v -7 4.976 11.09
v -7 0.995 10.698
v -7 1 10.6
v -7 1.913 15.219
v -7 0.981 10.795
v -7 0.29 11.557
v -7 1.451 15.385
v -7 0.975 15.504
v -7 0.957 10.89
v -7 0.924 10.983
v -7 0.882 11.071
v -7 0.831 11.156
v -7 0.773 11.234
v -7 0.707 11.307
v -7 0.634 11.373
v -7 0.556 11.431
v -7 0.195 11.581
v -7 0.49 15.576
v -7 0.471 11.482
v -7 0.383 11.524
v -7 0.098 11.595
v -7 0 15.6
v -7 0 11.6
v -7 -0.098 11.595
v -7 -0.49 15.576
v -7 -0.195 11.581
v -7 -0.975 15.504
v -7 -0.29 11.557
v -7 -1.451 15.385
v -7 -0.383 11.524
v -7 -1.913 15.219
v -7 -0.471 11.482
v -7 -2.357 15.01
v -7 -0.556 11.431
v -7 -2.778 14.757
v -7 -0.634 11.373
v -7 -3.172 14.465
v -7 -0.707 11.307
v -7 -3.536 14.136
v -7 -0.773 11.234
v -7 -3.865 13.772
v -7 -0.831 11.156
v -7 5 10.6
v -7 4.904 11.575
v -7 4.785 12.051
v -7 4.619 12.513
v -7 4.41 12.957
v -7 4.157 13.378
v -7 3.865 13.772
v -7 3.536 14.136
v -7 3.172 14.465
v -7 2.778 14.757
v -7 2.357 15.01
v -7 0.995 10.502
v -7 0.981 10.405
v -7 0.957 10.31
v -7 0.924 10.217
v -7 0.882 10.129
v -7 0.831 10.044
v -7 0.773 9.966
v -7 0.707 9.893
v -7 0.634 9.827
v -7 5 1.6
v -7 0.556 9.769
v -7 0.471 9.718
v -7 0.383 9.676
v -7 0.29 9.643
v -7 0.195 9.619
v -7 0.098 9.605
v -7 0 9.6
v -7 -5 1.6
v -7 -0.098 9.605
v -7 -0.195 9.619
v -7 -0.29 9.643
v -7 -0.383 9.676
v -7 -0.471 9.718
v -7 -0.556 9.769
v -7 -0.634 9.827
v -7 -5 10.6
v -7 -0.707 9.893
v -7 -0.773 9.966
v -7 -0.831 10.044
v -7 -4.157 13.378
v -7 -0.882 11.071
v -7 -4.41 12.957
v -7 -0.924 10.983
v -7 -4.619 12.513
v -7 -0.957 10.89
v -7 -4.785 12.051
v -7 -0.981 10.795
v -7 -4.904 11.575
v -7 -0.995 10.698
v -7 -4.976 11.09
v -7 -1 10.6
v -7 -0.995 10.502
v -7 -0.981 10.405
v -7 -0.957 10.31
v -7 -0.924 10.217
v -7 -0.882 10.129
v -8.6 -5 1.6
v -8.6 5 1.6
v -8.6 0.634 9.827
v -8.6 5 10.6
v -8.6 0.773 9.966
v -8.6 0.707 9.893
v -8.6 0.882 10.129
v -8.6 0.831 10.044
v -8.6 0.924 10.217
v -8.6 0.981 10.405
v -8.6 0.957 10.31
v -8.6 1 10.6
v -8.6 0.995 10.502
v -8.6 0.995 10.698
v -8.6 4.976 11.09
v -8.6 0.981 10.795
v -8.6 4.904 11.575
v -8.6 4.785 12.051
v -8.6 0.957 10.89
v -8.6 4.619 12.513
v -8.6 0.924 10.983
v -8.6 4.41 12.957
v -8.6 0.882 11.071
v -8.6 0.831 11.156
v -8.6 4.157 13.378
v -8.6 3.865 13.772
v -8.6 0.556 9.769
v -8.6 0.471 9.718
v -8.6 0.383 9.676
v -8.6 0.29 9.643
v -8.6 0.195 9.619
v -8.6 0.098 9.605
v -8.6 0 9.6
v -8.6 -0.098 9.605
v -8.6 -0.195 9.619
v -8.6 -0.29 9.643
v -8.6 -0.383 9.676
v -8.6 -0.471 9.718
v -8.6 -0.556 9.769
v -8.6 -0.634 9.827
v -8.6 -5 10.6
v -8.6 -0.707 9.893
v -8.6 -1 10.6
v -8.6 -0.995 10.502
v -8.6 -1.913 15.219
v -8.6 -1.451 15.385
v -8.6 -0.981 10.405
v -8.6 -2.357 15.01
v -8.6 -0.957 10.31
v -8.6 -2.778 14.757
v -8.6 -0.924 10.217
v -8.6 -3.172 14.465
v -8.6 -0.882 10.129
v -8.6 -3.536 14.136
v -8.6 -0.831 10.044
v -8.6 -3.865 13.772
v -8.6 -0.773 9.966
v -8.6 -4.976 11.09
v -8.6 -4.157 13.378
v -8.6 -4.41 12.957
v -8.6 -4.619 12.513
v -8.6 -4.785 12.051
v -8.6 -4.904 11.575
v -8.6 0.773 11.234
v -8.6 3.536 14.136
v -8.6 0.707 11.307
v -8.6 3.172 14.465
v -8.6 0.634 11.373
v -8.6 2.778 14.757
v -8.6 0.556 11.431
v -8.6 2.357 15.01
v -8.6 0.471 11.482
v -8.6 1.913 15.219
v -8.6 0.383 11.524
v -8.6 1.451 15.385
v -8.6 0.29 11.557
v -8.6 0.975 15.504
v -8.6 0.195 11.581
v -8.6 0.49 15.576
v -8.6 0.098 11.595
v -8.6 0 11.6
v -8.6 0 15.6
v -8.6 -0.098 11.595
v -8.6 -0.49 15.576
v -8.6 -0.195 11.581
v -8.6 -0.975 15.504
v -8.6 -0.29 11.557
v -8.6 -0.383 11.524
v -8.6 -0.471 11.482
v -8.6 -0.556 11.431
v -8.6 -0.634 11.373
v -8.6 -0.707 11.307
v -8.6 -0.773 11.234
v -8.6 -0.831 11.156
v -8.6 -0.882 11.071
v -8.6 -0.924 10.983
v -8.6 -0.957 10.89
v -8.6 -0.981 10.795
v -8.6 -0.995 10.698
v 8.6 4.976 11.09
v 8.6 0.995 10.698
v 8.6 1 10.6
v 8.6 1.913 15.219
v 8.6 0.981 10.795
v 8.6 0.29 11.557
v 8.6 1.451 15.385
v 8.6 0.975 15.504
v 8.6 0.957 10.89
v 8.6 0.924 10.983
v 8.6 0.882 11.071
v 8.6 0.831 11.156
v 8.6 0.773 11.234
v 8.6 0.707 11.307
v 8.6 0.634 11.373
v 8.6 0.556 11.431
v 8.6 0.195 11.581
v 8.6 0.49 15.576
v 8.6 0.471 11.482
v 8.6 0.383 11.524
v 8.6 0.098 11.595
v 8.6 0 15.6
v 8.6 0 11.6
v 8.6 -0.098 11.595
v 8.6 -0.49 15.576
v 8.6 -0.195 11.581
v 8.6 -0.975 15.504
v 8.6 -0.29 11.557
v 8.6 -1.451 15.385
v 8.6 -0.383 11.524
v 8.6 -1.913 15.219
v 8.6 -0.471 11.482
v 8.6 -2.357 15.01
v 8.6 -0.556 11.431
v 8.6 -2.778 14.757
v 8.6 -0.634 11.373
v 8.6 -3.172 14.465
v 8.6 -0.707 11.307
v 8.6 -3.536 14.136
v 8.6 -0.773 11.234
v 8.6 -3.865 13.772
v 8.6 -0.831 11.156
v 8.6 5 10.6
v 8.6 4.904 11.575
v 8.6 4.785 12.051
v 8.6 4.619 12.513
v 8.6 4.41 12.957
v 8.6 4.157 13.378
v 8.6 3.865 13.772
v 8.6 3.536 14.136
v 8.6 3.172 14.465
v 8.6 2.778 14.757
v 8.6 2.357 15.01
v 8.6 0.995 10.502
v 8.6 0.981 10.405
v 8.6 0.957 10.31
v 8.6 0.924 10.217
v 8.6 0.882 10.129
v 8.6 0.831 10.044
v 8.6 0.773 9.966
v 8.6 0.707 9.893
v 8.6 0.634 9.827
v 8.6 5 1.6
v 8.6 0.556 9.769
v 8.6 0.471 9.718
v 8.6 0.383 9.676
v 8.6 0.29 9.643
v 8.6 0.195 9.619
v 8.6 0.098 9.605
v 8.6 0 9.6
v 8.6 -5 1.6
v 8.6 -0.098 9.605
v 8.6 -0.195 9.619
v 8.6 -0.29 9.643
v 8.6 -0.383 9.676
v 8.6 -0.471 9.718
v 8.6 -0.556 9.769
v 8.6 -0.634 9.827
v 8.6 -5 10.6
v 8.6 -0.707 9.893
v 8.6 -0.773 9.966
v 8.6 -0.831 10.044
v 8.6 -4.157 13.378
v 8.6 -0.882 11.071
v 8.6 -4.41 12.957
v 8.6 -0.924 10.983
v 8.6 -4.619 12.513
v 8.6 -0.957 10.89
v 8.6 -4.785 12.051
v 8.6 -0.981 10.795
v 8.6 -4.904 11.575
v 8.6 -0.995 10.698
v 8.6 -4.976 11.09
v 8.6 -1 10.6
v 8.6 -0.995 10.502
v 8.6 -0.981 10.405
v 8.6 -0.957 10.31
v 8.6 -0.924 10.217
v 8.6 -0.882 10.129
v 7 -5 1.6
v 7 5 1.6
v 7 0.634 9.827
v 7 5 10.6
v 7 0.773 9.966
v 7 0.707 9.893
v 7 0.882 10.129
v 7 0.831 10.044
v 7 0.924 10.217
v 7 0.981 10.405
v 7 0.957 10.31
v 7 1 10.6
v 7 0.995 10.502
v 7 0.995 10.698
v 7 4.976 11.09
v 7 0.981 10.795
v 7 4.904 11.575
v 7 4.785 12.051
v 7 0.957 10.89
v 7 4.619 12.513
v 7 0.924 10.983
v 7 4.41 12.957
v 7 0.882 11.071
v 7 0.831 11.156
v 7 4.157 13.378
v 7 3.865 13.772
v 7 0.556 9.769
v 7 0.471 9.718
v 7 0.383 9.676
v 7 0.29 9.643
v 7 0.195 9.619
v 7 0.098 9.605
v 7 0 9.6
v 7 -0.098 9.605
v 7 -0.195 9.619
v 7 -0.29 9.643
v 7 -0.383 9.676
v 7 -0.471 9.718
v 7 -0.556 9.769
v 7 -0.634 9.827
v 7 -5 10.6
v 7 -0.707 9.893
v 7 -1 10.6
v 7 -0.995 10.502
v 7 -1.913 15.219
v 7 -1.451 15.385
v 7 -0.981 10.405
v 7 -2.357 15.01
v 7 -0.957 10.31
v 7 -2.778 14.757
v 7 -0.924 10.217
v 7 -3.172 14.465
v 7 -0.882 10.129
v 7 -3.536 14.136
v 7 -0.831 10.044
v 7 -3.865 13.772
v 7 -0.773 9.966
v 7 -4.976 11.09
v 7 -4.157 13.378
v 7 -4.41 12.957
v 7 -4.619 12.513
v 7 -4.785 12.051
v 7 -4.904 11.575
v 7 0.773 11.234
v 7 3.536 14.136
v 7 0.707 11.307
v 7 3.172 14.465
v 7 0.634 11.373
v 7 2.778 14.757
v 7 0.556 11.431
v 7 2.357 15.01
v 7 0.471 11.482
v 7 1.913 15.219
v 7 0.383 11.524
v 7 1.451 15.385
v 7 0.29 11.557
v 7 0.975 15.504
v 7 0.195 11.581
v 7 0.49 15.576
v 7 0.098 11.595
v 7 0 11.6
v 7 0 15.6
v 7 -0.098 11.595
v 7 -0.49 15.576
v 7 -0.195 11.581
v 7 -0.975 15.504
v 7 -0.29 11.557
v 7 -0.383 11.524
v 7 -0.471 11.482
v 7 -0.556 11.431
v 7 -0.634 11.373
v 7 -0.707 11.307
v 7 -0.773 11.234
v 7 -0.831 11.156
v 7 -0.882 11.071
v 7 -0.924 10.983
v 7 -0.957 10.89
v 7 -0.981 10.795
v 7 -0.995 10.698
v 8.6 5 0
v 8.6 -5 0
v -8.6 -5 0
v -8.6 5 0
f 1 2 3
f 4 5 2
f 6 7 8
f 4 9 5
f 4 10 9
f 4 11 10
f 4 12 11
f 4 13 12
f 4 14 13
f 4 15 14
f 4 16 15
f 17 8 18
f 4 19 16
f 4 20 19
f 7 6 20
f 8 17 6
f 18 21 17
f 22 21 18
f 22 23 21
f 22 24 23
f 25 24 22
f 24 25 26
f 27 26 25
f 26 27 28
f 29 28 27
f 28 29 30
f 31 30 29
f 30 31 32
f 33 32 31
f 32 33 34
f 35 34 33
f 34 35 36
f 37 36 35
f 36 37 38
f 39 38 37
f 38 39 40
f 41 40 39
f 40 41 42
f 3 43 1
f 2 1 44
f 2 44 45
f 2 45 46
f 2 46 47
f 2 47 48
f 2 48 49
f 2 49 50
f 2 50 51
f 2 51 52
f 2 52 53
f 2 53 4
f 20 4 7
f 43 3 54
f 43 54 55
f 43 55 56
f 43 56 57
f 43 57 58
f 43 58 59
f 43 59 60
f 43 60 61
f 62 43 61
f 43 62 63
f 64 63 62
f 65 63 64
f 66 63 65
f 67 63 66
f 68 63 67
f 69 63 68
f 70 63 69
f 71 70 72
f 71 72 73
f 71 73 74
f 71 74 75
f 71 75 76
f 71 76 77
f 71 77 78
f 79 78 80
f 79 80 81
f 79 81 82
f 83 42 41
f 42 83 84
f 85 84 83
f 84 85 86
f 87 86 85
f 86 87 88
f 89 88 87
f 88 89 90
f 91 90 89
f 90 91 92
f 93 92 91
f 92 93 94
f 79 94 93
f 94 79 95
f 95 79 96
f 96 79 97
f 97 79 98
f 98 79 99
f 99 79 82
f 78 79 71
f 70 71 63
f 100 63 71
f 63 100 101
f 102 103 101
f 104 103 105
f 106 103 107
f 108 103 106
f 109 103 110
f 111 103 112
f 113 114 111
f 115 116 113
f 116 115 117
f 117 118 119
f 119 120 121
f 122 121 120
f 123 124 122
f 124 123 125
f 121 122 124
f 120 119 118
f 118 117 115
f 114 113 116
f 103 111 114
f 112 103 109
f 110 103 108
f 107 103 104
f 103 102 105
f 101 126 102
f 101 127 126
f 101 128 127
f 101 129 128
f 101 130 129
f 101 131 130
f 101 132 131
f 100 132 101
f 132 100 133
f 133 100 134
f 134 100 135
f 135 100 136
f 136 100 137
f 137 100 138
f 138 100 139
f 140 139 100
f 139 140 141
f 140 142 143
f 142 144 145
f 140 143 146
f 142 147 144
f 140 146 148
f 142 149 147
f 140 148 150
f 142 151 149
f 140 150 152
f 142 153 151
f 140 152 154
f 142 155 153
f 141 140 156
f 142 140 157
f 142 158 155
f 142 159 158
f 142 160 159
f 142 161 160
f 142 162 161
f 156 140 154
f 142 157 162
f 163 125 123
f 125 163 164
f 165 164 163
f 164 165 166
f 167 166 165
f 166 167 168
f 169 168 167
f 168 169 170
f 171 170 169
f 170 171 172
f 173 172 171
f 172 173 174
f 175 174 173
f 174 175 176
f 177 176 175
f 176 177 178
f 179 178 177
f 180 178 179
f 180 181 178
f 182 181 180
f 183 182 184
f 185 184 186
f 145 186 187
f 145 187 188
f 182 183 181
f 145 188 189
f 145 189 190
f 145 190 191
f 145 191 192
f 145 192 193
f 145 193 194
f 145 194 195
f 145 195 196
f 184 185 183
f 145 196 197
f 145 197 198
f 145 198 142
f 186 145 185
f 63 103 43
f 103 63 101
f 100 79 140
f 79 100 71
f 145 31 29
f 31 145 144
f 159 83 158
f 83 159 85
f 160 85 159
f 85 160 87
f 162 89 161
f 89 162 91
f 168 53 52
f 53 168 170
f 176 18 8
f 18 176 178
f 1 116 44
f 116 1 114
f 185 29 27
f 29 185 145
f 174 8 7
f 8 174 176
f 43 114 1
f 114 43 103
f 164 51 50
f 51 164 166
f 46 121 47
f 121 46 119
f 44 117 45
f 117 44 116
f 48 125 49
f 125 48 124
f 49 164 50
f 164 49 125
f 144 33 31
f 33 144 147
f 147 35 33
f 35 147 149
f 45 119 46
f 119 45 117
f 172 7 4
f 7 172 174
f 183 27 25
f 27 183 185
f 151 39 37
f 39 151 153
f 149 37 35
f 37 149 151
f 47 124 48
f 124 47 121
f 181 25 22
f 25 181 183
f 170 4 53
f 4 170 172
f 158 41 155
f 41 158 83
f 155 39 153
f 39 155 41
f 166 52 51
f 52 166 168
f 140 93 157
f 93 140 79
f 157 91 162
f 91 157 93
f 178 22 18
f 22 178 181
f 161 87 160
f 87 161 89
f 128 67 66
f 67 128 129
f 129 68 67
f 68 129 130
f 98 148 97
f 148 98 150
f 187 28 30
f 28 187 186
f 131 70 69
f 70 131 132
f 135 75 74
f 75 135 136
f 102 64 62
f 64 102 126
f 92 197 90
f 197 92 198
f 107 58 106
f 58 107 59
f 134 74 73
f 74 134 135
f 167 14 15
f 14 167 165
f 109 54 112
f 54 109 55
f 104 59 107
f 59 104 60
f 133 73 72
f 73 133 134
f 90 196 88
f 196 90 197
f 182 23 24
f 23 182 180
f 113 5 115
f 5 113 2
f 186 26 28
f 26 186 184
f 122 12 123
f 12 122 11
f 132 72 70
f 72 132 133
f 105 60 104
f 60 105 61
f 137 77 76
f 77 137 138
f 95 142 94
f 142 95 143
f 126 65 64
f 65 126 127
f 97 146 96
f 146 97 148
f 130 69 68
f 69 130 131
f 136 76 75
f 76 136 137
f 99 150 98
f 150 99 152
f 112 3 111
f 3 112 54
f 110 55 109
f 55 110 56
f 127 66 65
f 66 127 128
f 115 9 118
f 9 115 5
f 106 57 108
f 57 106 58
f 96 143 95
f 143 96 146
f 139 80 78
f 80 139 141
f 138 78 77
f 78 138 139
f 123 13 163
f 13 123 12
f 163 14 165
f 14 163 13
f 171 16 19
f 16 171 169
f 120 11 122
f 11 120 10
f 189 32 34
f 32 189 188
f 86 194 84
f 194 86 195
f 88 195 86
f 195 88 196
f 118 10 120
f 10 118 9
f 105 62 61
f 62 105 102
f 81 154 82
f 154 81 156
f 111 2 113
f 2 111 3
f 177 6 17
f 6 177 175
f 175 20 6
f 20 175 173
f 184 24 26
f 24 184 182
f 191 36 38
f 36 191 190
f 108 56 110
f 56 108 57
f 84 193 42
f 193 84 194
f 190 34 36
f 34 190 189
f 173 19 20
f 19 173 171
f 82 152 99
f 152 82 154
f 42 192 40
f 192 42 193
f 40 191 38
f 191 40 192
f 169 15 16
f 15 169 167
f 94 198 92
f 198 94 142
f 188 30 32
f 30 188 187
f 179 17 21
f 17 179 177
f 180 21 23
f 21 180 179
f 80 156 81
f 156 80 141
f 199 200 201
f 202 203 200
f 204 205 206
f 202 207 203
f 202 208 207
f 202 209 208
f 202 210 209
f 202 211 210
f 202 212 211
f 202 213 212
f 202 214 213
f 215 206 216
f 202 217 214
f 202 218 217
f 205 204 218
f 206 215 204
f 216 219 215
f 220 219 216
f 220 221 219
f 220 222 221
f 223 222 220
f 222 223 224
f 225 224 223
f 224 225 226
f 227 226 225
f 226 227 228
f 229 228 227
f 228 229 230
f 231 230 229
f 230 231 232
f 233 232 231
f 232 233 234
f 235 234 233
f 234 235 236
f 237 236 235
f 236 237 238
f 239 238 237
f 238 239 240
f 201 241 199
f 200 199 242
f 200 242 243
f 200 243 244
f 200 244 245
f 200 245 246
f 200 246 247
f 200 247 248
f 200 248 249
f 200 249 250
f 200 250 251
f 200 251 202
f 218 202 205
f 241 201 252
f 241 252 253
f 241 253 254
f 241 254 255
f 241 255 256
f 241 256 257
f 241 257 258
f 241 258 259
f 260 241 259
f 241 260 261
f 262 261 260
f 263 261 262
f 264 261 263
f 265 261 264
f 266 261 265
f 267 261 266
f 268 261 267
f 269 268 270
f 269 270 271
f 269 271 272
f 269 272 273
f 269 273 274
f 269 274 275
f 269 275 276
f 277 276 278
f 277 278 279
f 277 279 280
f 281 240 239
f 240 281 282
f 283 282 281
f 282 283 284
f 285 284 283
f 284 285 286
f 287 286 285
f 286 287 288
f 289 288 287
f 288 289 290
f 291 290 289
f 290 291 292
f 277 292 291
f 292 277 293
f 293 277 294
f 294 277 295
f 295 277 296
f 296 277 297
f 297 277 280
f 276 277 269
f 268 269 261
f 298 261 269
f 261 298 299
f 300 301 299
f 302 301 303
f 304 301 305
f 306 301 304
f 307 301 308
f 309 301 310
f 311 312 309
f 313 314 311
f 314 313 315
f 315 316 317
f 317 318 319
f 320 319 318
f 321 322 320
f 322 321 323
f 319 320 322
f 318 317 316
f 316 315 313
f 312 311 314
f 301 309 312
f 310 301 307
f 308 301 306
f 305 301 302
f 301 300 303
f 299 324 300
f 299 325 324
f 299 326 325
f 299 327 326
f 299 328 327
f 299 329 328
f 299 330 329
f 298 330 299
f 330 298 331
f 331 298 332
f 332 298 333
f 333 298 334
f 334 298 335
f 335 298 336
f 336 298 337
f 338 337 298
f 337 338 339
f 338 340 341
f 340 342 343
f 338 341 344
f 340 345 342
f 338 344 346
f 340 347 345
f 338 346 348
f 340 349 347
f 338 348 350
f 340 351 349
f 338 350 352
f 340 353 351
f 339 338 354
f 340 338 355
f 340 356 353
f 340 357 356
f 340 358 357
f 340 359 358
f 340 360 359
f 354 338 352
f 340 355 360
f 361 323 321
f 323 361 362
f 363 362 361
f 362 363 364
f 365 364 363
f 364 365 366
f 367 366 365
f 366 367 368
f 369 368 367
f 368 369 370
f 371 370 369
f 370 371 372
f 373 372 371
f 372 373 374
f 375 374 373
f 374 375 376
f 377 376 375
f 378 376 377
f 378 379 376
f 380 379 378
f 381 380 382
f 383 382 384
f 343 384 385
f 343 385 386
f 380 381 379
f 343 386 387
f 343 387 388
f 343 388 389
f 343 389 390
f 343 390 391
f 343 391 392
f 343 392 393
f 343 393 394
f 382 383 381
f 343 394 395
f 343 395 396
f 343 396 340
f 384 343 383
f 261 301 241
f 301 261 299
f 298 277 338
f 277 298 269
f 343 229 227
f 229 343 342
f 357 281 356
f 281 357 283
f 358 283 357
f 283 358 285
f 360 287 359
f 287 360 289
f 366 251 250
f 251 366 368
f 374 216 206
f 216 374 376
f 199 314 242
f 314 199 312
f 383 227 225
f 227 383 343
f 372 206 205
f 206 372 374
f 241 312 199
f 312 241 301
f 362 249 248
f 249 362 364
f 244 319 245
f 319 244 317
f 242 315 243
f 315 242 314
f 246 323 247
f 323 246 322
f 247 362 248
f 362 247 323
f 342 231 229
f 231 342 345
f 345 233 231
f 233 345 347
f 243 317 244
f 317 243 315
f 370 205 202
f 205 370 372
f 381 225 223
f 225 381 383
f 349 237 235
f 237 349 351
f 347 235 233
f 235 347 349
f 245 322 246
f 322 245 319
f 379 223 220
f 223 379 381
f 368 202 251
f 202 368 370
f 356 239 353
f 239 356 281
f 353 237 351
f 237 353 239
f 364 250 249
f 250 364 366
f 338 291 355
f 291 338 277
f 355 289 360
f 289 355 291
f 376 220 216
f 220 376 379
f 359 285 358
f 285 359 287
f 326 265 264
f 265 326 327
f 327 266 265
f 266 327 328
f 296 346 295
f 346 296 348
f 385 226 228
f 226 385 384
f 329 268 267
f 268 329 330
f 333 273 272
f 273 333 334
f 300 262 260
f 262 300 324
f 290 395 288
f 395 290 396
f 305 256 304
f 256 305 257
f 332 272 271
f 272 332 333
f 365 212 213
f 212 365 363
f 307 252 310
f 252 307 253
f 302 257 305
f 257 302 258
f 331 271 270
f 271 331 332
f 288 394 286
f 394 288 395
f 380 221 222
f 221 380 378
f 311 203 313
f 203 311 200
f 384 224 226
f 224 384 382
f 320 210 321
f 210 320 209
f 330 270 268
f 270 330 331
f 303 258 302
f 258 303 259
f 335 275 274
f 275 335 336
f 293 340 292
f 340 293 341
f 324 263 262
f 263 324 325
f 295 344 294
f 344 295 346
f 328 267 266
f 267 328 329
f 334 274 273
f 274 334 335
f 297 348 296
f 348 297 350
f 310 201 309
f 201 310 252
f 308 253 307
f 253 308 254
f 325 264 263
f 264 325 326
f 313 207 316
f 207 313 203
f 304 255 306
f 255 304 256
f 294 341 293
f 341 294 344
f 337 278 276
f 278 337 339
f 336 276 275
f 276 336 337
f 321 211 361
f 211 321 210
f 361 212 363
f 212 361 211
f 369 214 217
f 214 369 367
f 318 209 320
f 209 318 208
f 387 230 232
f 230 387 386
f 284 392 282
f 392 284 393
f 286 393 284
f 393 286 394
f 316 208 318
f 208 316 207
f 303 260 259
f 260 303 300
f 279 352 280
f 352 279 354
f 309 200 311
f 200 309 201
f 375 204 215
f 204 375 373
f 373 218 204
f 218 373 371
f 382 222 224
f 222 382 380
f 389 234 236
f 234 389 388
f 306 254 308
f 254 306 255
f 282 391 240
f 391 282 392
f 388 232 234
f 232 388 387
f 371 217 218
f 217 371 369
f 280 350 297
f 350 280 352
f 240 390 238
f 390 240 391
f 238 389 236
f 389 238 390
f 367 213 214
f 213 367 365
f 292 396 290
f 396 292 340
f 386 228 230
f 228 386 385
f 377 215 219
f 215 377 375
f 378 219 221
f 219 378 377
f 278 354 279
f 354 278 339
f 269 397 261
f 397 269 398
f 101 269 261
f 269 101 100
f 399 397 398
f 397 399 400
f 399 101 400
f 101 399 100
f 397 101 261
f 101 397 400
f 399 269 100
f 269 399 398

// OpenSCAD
$fn = 64;

wall_thickness = 1.6;
mount_hole_diameter = 2;

// Creates a mounting arm. Height is the height to the mounting hole.
// height: The height to the mounting hole
// width: How far apart should the mount arms be
module mount_arm(
    height,
    width,
    hole_diameter=mount_hole_diameter) {
    
    translate([wall_thickness / -2, 0, 0])
    difference() {
        union() {
            translate([0, width / -2, 0])
            cube([wall_thickness, width, height]);
        
            translate([0, 0, height])
            rotate([0, 90, 0])
            cylinder(h = wall_thickness, r = width / 2);
        }


        translate([-0.1, 0, height])
        rotate([0, 90, 0])
        cylinder(h=wall_thickness + 0.2, r = hole_diameter / 2);
    }    
}

module base_plate(width, depth) {
    x_length = (width + (wall_thickness * 2));
    
    translate([x_length / -2, depth / -2, 0])
    cube([x_length, depth, wall_thickness]);
}

// height: The height from the base to the mounting holes
// width: Width between two mounting arms
// depth: The width of the mounting arms themselves.
module simple_mount(
    height = 9,
    width = 14,
    depth = 10
) {
    x_length = (width + (wall_thickness));
    
    translate([x_length / -2, 0, wall_thickness])
    mount_arm(height, depth);
   
    translate([x_length / 2, 0, wall_thickness])
    mount_arm(height, depth);
    
    base_plate(width, depth);
}

module camera_enclosure(
    height = 14,
    width = 14,
    depth = 14
) {
    
    difference() {
        
        cube([width + (2 * wall_thickness), height + (2 * wall_thickness), depth], center=true);
        
        translate([0, 0, wall_thickness])
        cube([width, height, depth], center=true);
     
        // Hole for wires, fits a Ph3 connector
        translate([0, 0, (depth / -2) - wall_thickness])
        cylinder(h=depth, r=3);
    }
}

module nano_base_plate() {
    base_plate(14, 10);
}

module nano_mount(height=9) {
    simple_mount(
        height = height,
        width = 14,
        depth = 10
    );
}

nano_mount();
